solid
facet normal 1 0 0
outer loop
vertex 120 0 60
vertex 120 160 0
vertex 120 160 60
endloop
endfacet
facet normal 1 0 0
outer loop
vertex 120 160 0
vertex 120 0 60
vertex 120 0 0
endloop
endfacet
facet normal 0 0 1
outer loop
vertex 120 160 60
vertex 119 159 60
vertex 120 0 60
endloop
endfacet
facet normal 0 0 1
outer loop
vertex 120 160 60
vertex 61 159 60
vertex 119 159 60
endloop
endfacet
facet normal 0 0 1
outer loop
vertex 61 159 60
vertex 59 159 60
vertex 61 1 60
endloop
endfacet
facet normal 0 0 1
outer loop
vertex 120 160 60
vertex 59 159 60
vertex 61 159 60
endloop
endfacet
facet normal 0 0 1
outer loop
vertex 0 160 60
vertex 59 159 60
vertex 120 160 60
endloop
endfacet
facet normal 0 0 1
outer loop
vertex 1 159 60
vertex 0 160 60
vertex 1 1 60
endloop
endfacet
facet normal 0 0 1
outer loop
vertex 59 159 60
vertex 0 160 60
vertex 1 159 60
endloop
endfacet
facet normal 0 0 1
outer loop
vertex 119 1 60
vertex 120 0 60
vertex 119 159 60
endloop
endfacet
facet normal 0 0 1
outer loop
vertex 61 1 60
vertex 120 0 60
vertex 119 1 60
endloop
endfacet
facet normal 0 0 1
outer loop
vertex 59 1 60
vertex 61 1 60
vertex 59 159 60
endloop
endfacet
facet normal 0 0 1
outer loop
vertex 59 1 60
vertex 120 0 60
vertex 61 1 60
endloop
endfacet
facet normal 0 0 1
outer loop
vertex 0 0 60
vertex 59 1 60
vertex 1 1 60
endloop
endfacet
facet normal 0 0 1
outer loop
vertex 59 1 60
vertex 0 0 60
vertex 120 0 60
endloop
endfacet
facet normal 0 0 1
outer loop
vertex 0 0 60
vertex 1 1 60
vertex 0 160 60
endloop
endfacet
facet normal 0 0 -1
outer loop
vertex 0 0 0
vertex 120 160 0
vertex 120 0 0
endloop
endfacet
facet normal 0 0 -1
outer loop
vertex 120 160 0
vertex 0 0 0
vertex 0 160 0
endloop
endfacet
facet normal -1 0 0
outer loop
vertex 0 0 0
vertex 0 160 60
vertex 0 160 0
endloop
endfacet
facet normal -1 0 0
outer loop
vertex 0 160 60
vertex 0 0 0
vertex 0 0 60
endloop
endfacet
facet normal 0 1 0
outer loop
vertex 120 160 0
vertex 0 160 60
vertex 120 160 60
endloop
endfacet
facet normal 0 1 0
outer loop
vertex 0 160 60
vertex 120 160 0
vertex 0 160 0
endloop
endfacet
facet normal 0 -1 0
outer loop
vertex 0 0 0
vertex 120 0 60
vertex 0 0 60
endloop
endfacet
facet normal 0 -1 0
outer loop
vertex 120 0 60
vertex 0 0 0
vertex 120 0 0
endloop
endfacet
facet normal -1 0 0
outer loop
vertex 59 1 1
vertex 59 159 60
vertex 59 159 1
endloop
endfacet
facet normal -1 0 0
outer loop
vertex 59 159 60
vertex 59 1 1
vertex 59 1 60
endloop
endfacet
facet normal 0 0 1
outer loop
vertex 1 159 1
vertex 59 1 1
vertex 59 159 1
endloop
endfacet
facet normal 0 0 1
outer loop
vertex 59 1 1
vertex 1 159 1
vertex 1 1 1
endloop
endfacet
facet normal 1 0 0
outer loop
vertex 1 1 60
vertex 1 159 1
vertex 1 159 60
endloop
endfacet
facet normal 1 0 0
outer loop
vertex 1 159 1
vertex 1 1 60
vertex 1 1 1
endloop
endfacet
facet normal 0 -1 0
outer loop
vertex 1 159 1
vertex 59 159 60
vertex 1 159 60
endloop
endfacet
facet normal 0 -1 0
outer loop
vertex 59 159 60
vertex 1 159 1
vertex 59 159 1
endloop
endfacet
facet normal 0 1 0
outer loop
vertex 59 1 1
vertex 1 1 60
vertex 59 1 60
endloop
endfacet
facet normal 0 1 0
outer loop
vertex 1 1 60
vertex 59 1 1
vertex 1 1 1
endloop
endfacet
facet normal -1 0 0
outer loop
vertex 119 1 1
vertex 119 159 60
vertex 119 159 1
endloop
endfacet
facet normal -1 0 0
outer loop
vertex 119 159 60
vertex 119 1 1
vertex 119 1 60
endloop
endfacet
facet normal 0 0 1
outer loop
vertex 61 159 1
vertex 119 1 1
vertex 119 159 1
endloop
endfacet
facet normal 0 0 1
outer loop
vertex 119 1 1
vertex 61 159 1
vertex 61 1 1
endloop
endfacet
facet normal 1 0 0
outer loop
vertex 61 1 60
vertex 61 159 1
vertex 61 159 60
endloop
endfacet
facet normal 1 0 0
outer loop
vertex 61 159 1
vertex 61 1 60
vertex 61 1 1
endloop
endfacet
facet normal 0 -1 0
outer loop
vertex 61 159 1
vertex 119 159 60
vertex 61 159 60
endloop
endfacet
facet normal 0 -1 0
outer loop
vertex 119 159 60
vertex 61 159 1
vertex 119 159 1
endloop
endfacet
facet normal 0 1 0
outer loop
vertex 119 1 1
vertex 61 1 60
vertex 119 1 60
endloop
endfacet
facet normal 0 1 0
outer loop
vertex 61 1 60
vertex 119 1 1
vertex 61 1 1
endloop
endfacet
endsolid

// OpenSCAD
difference() {
cube([120,160,60]);
translate([1,1,1]) cube([120/2-2,160-2,80]);
translate([61,1,1]) cube([120/2-2,160-2,80]);
}
